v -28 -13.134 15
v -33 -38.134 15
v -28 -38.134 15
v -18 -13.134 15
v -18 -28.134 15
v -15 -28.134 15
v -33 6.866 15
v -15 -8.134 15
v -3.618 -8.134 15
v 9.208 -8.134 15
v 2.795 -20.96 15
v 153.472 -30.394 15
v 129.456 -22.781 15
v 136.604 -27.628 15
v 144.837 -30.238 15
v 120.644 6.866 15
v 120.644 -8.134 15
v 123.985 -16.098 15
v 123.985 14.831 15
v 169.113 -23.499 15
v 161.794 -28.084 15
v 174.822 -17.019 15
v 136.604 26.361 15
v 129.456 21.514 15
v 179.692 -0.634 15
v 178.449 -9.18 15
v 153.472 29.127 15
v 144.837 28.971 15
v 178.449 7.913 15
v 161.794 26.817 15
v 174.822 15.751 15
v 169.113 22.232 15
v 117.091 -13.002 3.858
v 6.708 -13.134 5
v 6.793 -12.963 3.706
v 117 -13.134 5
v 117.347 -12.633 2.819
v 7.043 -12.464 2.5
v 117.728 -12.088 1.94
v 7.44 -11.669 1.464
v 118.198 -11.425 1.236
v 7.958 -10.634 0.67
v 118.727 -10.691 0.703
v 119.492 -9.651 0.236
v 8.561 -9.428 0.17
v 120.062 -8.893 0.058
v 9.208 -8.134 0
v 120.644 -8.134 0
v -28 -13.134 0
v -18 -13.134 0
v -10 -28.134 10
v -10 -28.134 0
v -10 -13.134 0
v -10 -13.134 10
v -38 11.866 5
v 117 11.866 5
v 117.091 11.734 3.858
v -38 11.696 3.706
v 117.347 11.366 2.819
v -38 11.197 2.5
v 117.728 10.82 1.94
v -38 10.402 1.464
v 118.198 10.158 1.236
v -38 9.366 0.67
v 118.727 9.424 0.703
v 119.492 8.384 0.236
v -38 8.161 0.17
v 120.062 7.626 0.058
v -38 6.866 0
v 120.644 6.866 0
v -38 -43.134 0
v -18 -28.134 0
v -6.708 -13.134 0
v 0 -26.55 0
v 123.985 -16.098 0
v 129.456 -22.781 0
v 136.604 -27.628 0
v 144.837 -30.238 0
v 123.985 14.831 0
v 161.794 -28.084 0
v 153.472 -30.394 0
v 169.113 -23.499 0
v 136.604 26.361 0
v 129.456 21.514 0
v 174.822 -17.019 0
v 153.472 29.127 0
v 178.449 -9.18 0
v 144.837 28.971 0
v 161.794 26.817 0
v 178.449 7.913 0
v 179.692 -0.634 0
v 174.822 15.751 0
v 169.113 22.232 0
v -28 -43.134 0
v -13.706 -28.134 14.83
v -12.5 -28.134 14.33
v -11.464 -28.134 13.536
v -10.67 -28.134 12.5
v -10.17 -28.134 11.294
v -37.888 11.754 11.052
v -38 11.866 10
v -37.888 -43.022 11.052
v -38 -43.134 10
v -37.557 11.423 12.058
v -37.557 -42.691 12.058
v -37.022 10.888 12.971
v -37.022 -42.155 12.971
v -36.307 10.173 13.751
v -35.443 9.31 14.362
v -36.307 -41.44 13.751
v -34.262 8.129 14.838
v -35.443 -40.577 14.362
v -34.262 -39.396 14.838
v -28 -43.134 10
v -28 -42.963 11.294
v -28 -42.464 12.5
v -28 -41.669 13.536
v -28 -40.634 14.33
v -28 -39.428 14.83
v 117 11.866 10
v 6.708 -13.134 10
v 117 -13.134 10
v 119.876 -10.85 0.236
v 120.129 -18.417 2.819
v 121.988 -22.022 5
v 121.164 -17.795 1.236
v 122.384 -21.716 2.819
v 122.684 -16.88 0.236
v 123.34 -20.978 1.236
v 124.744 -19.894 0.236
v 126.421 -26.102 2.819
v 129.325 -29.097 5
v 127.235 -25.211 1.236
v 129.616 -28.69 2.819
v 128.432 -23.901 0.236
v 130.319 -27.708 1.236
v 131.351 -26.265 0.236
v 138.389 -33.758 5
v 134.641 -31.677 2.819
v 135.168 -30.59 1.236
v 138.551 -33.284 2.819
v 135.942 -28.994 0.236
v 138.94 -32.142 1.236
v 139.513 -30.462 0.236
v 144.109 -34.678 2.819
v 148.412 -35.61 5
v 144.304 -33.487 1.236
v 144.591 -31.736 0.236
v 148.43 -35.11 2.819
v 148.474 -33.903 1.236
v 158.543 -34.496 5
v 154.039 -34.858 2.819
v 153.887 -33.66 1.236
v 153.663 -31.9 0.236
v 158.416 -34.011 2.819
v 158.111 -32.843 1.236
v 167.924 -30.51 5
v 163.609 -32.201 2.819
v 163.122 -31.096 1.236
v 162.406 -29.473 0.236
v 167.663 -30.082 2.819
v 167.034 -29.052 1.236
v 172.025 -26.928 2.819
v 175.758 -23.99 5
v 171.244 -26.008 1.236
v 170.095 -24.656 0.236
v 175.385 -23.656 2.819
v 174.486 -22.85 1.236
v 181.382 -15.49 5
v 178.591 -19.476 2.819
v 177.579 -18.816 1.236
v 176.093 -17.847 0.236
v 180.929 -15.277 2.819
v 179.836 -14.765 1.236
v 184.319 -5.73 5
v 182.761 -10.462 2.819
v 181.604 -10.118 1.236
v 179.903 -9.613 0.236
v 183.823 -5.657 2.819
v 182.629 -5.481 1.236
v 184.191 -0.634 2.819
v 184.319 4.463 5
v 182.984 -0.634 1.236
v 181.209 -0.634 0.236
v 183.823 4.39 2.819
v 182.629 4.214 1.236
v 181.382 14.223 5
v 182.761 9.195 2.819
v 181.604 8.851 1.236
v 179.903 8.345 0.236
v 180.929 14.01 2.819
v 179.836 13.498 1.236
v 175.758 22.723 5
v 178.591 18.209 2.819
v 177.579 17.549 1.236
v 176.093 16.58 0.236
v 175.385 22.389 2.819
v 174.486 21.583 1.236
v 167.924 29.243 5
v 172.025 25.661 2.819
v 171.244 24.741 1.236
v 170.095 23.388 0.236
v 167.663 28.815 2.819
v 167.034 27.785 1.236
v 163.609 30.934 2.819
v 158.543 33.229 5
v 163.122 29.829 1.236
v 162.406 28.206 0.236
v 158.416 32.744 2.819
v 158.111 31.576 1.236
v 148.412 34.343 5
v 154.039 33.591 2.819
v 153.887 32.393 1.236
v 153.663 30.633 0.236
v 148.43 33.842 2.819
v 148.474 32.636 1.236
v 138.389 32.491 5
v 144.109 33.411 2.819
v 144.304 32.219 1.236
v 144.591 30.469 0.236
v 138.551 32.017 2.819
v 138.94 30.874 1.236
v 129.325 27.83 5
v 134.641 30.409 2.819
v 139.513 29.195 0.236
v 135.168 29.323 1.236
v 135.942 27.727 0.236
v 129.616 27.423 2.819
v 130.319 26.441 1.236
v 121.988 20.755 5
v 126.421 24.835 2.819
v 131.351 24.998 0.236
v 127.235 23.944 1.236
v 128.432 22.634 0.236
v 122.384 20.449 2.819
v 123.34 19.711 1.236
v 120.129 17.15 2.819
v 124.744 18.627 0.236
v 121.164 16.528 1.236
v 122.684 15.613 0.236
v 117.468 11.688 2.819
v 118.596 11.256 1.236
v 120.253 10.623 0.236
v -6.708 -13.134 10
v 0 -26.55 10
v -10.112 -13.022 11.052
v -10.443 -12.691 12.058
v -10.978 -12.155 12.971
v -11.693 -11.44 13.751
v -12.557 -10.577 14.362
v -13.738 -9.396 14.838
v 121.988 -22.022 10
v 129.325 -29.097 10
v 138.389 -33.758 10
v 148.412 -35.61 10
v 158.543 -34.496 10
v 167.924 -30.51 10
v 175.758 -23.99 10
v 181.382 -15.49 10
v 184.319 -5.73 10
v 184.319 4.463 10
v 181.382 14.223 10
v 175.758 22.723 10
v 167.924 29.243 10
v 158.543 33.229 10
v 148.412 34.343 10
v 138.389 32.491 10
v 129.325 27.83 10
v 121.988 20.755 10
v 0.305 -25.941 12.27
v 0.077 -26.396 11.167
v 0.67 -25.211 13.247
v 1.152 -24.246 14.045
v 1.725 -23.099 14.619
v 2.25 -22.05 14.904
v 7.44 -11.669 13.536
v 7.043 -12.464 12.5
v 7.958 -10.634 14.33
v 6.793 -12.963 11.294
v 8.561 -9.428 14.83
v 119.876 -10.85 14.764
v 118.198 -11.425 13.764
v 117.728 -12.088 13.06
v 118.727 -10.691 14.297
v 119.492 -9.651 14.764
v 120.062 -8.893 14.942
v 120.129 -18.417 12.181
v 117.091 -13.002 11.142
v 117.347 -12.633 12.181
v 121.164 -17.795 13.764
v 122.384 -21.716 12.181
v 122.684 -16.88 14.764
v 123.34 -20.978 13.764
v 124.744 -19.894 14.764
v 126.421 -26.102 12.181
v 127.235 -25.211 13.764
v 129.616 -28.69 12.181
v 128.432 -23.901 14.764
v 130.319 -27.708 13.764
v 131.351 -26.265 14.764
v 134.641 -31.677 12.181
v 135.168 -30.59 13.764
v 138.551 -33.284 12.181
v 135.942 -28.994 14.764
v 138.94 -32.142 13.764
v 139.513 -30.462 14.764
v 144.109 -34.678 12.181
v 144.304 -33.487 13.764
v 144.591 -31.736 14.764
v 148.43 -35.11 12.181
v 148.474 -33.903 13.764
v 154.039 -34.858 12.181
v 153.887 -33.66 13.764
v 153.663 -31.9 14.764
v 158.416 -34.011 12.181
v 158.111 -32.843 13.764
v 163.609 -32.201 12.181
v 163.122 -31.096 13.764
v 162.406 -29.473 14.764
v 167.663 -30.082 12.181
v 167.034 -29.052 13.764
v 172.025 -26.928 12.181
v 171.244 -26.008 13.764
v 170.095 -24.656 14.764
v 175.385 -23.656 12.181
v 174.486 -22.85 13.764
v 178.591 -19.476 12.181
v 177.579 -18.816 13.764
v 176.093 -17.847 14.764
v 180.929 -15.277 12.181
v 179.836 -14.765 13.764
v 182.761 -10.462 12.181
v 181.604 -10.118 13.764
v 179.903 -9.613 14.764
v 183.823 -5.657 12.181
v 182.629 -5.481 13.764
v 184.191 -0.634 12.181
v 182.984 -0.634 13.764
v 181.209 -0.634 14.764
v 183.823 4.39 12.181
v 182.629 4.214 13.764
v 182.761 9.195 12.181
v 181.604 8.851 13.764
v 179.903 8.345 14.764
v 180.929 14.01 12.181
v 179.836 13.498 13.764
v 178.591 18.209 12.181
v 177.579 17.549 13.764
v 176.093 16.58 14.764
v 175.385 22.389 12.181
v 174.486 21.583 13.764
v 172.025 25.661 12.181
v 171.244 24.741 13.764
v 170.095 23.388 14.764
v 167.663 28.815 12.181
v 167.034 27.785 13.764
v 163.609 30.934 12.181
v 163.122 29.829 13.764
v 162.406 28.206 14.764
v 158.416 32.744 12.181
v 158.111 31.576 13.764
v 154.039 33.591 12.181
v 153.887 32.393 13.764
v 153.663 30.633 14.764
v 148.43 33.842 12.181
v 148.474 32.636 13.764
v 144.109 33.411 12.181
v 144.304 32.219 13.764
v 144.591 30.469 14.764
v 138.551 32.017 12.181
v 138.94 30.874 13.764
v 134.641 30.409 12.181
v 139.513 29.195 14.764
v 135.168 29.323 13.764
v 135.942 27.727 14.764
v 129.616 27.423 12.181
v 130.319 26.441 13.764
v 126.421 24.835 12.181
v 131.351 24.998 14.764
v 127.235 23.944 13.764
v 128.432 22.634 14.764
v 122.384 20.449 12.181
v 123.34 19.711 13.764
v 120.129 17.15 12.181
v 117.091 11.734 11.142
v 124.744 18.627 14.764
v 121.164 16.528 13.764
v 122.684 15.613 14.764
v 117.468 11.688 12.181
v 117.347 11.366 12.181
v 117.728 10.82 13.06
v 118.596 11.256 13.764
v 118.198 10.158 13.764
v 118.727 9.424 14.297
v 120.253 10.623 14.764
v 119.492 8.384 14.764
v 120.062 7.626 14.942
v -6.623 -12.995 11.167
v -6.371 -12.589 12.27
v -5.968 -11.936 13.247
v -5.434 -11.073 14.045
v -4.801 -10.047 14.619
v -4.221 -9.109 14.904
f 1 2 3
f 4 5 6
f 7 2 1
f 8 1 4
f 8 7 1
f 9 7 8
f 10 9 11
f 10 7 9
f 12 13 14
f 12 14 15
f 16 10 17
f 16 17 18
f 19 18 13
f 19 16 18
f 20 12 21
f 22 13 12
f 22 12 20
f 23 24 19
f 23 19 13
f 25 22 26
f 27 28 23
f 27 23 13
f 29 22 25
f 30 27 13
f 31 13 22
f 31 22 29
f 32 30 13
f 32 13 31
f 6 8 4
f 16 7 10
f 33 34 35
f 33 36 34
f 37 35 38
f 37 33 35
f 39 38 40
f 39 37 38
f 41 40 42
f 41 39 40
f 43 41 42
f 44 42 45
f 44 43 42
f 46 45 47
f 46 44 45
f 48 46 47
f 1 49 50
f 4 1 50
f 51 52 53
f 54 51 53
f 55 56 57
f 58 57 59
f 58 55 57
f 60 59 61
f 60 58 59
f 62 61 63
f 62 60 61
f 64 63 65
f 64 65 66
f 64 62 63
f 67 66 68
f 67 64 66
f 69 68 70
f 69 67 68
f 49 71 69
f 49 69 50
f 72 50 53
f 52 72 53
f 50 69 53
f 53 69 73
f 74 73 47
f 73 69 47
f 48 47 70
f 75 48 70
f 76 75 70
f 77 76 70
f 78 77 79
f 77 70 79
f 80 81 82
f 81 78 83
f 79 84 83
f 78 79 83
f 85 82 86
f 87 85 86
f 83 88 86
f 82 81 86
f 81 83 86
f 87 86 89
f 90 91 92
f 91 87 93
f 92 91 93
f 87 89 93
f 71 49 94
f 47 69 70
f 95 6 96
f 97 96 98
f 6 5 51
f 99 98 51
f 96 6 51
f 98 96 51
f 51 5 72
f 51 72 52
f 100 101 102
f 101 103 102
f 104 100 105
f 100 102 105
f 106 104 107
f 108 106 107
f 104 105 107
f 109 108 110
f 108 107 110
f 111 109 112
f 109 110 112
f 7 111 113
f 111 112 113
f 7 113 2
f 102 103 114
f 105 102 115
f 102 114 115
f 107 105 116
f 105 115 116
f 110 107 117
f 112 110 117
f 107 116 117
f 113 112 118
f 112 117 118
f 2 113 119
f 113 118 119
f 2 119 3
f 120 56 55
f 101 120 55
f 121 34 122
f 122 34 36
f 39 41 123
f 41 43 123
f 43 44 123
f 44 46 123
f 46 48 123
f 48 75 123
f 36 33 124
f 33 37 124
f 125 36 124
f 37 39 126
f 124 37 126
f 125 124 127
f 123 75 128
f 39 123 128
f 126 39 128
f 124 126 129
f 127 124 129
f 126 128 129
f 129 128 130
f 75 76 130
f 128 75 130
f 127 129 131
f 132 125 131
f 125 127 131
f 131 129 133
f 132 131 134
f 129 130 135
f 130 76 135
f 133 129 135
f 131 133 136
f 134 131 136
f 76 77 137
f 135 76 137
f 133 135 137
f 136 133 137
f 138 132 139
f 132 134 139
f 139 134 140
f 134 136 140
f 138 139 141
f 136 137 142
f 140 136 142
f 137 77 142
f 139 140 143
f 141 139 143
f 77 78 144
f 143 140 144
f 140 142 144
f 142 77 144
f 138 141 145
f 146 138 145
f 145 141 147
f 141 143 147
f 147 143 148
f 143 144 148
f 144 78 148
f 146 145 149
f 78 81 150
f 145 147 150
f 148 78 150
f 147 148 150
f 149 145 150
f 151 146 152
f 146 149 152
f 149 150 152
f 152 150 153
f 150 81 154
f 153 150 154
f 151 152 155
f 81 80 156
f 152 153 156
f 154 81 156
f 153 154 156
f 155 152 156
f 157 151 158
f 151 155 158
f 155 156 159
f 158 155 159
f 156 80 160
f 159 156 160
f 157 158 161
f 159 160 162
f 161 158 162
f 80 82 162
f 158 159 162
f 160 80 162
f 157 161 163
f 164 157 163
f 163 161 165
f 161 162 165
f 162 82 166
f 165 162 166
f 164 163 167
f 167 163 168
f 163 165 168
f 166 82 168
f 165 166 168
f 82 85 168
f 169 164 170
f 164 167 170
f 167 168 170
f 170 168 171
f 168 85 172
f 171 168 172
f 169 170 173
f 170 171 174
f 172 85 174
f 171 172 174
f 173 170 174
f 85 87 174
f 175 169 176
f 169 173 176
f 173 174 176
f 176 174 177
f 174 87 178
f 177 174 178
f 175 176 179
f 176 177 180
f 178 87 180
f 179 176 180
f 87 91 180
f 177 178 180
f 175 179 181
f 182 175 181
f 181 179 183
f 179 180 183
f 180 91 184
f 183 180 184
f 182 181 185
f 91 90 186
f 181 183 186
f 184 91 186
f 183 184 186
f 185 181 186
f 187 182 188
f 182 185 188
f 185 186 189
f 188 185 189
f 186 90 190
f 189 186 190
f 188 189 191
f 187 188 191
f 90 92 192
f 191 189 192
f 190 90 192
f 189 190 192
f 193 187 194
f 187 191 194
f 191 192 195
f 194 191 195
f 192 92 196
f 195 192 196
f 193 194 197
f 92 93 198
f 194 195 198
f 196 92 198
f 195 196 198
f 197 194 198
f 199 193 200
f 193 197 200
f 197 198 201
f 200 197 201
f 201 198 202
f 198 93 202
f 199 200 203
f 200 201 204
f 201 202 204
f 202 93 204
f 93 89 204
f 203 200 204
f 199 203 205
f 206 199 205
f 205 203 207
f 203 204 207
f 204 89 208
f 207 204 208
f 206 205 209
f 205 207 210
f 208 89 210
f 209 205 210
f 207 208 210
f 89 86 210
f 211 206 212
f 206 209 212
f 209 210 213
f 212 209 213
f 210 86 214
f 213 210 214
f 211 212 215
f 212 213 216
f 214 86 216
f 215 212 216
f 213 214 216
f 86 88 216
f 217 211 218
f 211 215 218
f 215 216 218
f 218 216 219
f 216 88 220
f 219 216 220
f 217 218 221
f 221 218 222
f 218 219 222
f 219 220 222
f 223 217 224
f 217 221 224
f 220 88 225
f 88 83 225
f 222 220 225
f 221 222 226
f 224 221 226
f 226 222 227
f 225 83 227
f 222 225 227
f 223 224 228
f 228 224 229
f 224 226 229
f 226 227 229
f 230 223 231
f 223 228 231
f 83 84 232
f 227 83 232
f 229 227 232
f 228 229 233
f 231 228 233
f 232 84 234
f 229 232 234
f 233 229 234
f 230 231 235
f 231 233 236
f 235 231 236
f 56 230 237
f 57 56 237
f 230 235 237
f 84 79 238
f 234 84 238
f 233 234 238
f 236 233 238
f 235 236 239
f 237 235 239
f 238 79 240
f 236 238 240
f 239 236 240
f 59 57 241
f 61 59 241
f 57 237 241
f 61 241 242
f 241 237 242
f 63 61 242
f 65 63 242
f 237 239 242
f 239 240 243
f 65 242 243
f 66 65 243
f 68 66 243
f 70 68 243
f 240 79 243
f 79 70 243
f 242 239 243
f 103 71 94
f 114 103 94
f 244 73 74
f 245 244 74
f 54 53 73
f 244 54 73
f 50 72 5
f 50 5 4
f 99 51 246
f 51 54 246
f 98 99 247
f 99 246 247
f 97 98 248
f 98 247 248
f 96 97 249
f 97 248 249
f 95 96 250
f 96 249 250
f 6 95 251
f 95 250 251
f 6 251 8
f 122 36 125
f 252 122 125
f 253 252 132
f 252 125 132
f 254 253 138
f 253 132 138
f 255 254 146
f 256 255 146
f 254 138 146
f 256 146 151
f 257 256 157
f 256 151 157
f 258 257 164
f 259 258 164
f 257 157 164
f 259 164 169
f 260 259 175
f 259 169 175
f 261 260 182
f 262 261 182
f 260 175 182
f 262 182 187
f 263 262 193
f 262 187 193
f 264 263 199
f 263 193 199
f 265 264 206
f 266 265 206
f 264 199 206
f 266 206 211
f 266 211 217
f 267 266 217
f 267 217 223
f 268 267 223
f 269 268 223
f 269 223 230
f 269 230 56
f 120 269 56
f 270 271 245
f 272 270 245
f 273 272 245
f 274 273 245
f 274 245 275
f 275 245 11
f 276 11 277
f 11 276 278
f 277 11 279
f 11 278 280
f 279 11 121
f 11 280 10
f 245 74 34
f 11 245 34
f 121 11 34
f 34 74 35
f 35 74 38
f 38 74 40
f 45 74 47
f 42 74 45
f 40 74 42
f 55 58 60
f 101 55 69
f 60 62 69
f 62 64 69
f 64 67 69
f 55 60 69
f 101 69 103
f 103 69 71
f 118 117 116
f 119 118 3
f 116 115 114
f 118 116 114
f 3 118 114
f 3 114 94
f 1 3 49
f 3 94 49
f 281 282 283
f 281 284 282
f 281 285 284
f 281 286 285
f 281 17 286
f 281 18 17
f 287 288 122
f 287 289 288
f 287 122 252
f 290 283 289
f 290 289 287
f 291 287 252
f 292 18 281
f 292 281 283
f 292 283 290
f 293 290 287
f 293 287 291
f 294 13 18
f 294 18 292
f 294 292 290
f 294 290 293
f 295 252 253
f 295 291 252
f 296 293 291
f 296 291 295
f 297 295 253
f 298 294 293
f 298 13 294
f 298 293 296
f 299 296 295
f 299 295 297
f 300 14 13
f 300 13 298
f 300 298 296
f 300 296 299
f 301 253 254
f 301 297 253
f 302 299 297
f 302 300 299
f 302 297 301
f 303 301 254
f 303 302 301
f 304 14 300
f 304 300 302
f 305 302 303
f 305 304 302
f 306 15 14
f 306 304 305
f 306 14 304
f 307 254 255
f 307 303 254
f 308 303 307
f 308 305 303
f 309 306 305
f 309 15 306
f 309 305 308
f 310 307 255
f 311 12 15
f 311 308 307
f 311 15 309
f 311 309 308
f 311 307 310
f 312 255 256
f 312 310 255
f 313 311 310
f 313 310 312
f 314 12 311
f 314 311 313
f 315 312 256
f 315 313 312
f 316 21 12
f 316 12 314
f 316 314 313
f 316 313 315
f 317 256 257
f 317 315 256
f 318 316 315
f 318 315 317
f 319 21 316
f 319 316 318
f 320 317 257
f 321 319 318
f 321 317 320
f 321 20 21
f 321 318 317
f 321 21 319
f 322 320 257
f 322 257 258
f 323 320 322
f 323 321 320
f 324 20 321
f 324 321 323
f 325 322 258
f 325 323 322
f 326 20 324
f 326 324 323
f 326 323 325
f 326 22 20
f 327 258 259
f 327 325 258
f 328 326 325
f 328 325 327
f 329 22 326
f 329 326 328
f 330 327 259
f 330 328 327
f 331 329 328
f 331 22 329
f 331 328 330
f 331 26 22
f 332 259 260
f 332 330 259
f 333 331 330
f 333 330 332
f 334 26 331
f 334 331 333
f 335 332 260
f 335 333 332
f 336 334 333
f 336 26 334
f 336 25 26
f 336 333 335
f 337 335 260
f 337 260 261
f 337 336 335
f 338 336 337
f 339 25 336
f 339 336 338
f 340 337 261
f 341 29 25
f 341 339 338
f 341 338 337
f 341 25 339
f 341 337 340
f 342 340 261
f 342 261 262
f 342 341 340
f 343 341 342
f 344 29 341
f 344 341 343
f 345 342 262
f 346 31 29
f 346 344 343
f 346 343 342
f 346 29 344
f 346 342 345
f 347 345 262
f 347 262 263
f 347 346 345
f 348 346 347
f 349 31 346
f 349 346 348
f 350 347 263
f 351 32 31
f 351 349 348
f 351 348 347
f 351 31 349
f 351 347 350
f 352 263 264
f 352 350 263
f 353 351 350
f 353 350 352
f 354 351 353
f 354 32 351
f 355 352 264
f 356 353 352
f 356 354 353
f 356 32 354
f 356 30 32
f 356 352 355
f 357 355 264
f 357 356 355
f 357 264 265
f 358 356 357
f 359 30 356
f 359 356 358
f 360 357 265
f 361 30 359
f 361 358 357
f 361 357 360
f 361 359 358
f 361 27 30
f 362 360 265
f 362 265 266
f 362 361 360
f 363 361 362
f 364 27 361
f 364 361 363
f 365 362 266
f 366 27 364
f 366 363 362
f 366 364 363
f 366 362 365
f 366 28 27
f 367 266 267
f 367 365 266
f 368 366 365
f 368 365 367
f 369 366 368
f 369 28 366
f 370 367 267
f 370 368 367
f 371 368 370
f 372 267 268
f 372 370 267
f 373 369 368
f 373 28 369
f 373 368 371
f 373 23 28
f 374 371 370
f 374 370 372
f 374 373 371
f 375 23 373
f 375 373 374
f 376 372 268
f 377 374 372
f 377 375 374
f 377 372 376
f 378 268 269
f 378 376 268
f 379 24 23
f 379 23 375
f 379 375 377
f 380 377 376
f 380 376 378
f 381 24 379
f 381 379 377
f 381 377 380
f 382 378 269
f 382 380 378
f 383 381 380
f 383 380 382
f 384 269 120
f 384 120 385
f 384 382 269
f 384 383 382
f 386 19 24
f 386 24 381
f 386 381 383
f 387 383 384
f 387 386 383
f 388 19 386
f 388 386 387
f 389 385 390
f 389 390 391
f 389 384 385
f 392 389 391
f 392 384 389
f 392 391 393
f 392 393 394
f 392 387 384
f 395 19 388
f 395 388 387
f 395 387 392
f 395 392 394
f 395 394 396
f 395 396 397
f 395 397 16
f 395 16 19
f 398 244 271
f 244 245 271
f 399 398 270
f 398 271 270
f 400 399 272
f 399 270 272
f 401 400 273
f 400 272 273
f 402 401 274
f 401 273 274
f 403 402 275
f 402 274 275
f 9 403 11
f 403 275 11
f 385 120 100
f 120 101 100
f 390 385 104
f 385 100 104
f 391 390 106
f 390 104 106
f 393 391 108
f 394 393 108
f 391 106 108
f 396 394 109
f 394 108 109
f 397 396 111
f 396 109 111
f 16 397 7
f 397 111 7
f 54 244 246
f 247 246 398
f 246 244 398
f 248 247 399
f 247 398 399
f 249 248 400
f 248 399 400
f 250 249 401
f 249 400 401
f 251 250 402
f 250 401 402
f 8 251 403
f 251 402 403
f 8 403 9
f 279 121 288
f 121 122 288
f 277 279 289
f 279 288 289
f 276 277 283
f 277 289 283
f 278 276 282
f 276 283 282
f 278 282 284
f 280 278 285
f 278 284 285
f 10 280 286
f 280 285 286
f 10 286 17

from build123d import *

# Parameters (mm, degrees)
F0_W     = 10
F0_H     = 30
F0_W_2   = 8
F0_H_2   = 15
F1_DEPTH = 15
F2_R     = 5


with BuildPart() as f1:
    # F0 (on Top) → F1 (new body)
    with BuildSketch(Plane.XY):
        with BuildLine():
            ThreePointArc((117, -13.1335928523), (184.6917420766, -0.6335928523), (117, 11.8664071477))
            Line((117, 11.8664071477), (117, -0.5232350183))
            Line((117, -0.5232350183), (117, -13.1335928523))
        make_face()
        with BuildLine():
            ThreePointArc((167.1917420766, -0.6335928523), (149.6622047421, -18.133567925), (132.1918417856, -0.5745182675))
            ThreePointArc((132.1918417856, -0.5745182675), (149.721279411, 16.8663822204), (167.1917420766, -0.6335928523))
        make_face(mode=Mode.SUBTRACT)
        Polygon((117, -0.5232350183), (-38, 0), (-38, -13.1335928523), (-28, -13.1335928523), (-18, -13.1335928523), (-10, -13.1335928523), (-6.7082043002, -13.1335928523), (6.7082043002, -13.1335928523), (117, -13.1335928523), align=None)
        Polygon((117, 11.8664071477), (-38, 11.8664071477), (-38, 0), (117, -0.5232350183), align=None)
        with BuildLine():
            ThreePointArc((167.1917420766, -0.6335928523), (149.721279411, 16.8663822204), (132.1918417856, -0.5745182675))
            ThreePointArc((132.1918417856, -0.5745182675), (149.6622047421, -18.133567925), (167.1917420766, -0.6335928523))
        make_face()
        with Locations((-33, -28.1335928523)):
            Rectangle(F0_W, F0_H)
        with Locations((-14, -20.6335928523)):
            Rectangle(F0_W_2, F0_H_2)
        Polygon((0, -26.5500005335), (6.7082043002, -13.1335928523), (-6.7082043002, -13.1335928523), align=None)
    extrude(amount=F1_DEPTH)

    # F2
    f2_edges = [f1.edges().sort_by_distance(p)[0] for p in [
        (39.5, 11.866407, 15),
        (61.854102, -13.133593, 15),
        (184.691742, -0.633593, 15),
        (-3.354102, -19.841797, 15),
        (-8.354102, -13.133593, 15),
        (-10, -20.633593, 15),
        (-33, -43.133593, 15),
        (-38, -15.633593, 15),
        (39.5, 11.866407, 0),
        (184.691742, -0.633593, 0),
        (61.854102, -13.133593, 0),
    ]]
    fillet(f2_edges, radius=F2_R)


solid = f1.part
